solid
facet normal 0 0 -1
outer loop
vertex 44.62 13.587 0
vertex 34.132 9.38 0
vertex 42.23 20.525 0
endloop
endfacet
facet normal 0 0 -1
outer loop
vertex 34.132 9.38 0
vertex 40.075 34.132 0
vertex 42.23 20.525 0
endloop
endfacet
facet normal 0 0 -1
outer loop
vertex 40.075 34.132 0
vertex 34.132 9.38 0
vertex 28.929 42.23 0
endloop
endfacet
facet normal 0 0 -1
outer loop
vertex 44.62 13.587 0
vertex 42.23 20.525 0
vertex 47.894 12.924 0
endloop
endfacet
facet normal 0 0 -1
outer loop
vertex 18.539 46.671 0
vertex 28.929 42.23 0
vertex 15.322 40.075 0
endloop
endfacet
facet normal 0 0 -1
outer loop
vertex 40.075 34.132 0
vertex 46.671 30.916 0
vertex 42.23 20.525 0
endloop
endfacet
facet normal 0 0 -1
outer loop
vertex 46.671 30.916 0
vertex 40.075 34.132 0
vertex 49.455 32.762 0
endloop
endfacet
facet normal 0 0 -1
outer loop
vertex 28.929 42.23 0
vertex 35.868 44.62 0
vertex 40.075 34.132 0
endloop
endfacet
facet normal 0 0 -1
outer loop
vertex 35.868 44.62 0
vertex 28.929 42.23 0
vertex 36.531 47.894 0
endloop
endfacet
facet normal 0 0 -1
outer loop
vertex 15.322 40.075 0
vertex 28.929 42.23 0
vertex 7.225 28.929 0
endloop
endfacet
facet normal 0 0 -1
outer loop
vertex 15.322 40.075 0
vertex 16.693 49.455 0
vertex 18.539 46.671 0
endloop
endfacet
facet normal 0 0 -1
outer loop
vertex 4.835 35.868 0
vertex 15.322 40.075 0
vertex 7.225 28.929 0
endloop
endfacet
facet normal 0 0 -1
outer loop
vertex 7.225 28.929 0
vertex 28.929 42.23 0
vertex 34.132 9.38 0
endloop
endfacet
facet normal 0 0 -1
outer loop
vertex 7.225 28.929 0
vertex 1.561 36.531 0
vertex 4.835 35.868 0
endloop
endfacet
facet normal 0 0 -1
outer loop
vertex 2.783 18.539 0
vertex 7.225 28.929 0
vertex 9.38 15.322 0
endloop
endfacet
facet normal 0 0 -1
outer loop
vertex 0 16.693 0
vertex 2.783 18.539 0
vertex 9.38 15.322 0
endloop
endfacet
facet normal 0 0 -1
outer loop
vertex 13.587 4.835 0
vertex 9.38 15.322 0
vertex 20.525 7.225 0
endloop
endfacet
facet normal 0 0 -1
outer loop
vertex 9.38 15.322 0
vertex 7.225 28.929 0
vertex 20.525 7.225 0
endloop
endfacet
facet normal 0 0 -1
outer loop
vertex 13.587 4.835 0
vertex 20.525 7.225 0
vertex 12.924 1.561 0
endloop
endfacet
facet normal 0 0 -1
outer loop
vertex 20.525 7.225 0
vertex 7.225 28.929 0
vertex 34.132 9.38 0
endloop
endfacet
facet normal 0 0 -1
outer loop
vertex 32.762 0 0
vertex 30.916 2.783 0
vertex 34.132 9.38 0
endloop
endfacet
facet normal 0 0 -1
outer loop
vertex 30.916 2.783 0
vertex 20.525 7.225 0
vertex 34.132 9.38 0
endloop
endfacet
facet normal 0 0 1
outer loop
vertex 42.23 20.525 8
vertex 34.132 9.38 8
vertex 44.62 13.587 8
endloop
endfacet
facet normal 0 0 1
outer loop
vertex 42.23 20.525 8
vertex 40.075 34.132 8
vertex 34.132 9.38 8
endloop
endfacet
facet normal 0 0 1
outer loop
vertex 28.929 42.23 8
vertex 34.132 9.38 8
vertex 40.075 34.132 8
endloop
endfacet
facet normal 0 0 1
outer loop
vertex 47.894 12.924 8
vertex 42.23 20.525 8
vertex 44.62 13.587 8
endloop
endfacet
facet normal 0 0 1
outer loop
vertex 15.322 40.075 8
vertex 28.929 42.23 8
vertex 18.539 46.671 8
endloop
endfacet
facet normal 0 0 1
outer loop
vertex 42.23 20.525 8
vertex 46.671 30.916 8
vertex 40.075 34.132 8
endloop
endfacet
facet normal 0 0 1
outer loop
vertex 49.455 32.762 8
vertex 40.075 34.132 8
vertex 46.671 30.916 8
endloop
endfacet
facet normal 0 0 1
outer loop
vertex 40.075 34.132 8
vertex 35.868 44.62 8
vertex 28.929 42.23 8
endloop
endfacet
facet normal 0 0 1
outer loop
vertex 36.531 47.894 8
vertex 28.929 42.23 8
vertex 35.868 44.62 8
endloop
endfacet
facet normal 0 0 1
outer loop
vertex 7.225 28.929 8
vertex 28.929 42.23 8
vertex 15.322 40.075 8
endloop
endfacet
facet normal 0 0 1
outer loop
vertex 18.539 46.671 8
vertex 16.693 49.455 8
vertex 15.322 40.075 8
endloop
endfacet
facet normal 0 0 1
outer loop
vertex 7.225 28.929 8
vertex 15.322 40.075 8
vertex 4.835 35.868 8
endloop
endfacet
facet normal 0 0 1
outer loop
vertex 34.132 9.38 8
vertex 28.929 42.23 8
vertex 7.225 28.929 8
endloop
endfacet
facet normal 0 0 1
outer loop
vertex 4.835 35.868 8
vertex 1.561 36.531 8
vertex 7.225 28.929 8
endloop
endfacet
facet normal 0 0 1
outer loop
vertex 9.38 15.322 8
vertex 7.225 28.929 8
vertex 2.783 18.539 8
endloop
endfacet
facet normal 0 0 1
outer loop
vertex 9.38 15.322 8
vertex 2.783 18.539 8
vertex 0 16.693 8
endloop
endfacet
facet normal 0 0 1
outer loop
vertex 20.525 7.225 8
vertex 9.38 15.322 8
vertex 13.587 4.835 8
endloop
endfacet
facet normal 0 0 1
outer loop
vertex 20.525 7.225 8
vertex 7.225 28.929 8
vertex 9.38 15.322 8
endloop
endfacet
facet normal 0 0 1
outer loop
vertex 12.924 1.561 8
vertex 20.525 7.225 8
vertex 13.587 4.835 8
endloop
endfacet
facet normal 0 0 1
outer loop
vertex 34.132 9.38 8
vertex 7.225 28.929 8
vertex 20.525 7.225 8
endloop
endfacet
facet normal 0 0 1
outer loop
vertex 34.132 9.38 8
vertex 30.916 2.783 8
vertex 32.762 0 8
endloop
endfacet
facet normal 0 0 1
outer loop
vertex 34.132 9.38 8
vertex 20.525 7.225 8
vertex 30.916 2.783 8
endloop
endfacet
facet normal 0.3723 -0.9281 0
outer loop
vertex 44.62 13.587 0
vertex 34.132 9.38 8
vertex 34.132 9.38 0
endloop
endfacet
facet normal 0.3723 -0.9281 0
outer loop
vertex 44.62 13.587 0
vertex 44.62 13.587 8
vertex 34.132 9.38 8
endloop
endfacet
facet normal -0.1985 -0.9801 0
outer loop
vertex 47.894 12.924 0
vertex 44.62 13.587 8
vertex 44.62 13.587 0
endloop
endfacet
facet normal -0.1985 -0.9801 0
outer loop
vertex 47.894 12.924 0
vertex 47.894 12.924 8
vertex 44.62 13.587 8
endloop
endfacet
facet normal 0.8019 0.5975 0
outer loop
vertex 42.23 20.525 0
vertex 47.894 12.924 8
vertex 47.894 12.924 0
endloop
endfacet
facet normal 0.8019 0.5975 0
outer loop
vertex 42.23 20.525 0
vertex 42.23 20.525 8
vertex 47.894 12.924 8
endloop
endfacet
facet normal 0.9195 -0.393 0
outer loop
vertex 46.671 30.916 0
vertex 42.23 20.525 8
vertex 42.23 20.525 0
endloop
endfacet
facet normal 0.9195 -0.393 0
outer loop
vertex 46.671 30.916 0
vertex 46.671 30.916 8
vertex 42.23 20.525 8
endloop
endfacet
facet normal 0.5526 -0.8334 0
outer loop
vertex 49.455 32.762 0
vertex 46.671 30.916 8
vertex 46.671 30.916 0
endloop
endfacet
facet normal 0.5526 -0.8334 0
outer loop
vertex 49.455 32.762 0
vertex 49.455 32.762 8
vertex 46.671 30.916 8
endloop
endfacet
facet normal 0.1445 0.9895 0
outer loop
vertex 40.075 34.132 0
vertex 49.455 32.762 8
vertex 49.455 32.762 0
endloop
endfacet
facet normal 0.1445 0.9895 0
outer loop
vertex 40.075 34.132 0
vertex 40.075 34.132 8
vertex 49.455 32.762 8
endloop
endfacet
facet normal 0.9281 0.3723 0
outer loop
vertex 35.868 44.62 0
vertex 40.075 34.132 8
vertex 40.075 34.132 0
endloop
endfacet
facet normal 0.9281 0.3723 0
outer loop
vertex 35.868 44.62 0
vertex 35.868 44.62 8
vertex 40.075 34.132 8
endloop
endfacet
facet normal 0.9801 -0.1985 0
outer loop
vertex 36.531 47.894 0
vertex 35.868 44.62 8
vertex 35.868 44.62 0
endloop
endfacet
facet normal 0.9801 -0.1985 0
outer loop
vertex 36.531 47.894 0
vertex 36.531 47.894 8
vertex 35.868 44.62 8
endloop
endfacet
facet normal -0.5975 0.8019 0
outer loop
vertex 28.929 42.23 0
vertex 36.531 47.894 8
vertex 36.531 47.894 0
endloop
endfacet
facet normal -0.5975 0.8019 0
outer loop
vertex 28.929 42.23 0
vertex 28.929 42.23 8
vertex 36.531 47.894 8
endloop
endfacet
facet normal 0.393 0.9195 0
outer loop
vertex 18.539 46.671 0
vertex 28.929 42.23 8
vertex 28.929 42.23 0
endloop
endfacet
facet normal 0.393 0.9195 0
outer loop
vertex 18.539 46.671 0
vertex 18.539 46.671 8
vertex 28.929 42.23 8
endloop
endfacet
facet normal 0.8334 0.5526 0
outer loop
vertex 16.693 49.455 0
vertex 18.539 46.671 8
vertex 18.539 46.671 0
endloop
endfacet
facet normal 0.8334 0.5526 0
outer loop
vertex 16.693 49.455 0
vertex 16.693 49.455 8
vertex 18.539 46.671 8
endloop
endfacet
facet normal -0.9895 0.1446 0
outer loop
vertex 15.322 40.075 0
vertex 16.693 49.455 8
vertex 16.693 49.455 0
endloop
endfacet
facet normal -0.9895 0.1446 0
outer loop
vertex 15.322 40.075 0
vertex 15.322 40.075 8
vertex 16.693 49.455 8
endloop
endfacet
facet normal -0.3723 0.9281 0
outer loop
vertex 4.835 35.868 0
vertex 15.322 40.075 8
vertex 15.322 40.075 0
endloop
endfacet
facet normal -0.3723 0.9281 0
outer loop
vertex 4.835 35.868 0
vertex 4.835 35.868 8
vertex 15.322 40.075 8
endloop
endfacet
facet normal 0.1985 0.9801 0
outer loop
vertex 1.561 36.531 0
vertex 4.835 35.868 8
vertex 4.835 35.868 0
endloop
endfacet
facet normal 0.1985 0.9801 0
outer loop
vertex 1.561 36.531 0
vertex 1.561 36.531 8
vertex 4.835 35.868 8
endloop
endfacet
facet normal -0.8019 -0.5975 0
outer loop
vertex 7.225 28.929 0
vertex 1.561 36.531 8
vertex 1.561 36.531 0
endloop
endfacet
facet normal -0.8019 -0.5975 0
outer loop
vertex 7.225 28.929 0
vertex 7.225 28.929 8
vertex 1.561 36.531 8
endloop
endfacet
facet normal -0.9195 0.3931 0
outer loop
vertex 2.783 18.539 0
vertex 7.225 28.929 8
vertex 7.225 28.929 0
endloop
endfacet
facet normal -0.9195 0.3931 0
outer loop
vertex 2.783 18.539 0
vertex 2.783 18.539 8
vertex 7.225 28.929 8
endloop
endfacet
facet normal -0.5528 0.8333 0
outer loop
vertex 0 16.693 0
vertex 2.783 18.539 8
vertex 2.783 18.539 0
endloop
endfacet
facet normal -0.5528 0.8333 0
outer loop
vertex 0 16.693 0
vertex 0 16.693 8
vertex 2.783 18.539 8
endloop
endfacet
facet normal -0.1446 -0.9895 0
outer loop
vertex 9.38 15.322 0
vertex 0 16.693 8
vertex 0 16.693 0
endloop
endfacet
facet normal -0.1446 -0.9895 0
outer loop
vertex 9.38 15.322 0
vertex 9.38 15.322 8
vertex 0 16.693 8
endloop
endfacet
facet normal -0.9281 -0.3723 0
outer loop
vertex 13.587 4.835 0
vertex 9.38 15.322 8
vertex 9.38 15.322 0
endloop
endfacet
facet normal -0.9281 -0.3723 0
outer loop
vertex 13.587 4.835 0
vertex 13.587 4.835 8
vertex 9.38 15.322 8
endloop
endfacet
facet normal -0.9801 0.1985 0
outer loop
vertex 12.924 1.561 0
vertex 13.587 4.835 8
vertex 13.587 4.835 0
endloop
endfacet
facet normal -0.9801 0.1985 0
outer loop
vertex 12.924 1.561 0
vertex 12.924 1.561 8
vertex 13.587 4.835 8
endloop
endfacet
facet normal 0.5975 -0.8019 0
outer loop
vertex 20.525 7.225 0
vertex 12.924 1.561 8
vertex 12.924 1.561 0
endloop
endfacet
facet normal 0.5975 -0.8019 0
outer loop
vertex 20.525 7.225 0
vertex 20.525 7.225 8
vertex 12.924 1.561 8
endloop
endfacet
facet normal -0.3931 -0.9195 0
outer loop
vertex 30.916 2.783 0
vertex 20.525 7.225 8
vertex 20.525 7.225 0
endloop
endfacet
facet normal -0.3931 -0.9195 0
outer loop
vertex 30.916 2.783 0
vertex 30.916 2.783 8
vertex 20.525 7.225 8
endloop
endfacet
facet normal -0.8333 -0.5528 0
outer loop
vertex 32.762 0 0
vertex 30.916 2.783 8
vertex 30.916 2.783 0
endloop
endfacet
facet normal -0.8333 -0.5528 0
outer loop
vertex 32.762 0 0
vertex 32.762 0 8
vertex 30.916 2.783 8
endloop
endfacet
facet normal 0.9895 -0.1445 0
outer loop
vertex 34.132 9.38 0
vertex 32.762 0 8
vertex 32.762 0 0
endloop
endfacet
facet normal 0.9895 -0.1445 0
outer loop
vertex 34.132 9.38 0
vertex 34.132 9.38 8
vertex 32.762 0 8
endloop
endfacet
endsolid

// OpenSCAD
$fn = 32;

// ----------------------------------------------------------------------
// Fan rotor section: 8 blades, 18 mm hub radius, 8 mm blades
// ----------------------------------------------------------------------

// --- parameters (mm) ---
profile_height = 8;       // extrusion height
profile_points = 24;      // points of the closed outline

profile = [[42.23, 20.525], [46.671, 30.916], [49.455, 32.762], [40.075, 34.132], [35.868, 44.62], [36.531, 47.894], [28.929, 42.23], [18.539, 46.671], [16.693, 49.455], [15.322, 40.075], [4.835, 35.868], [1.561, 36.531], [7.225, 28.929], [2.783, 18.539], [0, 16.693], [9.38, 15.322], [13.587, 4.835], [12.924, 1.561], [20.525, 7.225], [30.916, 2.783], [32.762, 0], [34.132, 9.38], [44.62, 13.587], [47.894, 12.924]];  // single closed polygon, 24 points, counter clockwise

// --- the one profile operation ---
linear_extrude(height = profile_height) polygon(points = profile);
